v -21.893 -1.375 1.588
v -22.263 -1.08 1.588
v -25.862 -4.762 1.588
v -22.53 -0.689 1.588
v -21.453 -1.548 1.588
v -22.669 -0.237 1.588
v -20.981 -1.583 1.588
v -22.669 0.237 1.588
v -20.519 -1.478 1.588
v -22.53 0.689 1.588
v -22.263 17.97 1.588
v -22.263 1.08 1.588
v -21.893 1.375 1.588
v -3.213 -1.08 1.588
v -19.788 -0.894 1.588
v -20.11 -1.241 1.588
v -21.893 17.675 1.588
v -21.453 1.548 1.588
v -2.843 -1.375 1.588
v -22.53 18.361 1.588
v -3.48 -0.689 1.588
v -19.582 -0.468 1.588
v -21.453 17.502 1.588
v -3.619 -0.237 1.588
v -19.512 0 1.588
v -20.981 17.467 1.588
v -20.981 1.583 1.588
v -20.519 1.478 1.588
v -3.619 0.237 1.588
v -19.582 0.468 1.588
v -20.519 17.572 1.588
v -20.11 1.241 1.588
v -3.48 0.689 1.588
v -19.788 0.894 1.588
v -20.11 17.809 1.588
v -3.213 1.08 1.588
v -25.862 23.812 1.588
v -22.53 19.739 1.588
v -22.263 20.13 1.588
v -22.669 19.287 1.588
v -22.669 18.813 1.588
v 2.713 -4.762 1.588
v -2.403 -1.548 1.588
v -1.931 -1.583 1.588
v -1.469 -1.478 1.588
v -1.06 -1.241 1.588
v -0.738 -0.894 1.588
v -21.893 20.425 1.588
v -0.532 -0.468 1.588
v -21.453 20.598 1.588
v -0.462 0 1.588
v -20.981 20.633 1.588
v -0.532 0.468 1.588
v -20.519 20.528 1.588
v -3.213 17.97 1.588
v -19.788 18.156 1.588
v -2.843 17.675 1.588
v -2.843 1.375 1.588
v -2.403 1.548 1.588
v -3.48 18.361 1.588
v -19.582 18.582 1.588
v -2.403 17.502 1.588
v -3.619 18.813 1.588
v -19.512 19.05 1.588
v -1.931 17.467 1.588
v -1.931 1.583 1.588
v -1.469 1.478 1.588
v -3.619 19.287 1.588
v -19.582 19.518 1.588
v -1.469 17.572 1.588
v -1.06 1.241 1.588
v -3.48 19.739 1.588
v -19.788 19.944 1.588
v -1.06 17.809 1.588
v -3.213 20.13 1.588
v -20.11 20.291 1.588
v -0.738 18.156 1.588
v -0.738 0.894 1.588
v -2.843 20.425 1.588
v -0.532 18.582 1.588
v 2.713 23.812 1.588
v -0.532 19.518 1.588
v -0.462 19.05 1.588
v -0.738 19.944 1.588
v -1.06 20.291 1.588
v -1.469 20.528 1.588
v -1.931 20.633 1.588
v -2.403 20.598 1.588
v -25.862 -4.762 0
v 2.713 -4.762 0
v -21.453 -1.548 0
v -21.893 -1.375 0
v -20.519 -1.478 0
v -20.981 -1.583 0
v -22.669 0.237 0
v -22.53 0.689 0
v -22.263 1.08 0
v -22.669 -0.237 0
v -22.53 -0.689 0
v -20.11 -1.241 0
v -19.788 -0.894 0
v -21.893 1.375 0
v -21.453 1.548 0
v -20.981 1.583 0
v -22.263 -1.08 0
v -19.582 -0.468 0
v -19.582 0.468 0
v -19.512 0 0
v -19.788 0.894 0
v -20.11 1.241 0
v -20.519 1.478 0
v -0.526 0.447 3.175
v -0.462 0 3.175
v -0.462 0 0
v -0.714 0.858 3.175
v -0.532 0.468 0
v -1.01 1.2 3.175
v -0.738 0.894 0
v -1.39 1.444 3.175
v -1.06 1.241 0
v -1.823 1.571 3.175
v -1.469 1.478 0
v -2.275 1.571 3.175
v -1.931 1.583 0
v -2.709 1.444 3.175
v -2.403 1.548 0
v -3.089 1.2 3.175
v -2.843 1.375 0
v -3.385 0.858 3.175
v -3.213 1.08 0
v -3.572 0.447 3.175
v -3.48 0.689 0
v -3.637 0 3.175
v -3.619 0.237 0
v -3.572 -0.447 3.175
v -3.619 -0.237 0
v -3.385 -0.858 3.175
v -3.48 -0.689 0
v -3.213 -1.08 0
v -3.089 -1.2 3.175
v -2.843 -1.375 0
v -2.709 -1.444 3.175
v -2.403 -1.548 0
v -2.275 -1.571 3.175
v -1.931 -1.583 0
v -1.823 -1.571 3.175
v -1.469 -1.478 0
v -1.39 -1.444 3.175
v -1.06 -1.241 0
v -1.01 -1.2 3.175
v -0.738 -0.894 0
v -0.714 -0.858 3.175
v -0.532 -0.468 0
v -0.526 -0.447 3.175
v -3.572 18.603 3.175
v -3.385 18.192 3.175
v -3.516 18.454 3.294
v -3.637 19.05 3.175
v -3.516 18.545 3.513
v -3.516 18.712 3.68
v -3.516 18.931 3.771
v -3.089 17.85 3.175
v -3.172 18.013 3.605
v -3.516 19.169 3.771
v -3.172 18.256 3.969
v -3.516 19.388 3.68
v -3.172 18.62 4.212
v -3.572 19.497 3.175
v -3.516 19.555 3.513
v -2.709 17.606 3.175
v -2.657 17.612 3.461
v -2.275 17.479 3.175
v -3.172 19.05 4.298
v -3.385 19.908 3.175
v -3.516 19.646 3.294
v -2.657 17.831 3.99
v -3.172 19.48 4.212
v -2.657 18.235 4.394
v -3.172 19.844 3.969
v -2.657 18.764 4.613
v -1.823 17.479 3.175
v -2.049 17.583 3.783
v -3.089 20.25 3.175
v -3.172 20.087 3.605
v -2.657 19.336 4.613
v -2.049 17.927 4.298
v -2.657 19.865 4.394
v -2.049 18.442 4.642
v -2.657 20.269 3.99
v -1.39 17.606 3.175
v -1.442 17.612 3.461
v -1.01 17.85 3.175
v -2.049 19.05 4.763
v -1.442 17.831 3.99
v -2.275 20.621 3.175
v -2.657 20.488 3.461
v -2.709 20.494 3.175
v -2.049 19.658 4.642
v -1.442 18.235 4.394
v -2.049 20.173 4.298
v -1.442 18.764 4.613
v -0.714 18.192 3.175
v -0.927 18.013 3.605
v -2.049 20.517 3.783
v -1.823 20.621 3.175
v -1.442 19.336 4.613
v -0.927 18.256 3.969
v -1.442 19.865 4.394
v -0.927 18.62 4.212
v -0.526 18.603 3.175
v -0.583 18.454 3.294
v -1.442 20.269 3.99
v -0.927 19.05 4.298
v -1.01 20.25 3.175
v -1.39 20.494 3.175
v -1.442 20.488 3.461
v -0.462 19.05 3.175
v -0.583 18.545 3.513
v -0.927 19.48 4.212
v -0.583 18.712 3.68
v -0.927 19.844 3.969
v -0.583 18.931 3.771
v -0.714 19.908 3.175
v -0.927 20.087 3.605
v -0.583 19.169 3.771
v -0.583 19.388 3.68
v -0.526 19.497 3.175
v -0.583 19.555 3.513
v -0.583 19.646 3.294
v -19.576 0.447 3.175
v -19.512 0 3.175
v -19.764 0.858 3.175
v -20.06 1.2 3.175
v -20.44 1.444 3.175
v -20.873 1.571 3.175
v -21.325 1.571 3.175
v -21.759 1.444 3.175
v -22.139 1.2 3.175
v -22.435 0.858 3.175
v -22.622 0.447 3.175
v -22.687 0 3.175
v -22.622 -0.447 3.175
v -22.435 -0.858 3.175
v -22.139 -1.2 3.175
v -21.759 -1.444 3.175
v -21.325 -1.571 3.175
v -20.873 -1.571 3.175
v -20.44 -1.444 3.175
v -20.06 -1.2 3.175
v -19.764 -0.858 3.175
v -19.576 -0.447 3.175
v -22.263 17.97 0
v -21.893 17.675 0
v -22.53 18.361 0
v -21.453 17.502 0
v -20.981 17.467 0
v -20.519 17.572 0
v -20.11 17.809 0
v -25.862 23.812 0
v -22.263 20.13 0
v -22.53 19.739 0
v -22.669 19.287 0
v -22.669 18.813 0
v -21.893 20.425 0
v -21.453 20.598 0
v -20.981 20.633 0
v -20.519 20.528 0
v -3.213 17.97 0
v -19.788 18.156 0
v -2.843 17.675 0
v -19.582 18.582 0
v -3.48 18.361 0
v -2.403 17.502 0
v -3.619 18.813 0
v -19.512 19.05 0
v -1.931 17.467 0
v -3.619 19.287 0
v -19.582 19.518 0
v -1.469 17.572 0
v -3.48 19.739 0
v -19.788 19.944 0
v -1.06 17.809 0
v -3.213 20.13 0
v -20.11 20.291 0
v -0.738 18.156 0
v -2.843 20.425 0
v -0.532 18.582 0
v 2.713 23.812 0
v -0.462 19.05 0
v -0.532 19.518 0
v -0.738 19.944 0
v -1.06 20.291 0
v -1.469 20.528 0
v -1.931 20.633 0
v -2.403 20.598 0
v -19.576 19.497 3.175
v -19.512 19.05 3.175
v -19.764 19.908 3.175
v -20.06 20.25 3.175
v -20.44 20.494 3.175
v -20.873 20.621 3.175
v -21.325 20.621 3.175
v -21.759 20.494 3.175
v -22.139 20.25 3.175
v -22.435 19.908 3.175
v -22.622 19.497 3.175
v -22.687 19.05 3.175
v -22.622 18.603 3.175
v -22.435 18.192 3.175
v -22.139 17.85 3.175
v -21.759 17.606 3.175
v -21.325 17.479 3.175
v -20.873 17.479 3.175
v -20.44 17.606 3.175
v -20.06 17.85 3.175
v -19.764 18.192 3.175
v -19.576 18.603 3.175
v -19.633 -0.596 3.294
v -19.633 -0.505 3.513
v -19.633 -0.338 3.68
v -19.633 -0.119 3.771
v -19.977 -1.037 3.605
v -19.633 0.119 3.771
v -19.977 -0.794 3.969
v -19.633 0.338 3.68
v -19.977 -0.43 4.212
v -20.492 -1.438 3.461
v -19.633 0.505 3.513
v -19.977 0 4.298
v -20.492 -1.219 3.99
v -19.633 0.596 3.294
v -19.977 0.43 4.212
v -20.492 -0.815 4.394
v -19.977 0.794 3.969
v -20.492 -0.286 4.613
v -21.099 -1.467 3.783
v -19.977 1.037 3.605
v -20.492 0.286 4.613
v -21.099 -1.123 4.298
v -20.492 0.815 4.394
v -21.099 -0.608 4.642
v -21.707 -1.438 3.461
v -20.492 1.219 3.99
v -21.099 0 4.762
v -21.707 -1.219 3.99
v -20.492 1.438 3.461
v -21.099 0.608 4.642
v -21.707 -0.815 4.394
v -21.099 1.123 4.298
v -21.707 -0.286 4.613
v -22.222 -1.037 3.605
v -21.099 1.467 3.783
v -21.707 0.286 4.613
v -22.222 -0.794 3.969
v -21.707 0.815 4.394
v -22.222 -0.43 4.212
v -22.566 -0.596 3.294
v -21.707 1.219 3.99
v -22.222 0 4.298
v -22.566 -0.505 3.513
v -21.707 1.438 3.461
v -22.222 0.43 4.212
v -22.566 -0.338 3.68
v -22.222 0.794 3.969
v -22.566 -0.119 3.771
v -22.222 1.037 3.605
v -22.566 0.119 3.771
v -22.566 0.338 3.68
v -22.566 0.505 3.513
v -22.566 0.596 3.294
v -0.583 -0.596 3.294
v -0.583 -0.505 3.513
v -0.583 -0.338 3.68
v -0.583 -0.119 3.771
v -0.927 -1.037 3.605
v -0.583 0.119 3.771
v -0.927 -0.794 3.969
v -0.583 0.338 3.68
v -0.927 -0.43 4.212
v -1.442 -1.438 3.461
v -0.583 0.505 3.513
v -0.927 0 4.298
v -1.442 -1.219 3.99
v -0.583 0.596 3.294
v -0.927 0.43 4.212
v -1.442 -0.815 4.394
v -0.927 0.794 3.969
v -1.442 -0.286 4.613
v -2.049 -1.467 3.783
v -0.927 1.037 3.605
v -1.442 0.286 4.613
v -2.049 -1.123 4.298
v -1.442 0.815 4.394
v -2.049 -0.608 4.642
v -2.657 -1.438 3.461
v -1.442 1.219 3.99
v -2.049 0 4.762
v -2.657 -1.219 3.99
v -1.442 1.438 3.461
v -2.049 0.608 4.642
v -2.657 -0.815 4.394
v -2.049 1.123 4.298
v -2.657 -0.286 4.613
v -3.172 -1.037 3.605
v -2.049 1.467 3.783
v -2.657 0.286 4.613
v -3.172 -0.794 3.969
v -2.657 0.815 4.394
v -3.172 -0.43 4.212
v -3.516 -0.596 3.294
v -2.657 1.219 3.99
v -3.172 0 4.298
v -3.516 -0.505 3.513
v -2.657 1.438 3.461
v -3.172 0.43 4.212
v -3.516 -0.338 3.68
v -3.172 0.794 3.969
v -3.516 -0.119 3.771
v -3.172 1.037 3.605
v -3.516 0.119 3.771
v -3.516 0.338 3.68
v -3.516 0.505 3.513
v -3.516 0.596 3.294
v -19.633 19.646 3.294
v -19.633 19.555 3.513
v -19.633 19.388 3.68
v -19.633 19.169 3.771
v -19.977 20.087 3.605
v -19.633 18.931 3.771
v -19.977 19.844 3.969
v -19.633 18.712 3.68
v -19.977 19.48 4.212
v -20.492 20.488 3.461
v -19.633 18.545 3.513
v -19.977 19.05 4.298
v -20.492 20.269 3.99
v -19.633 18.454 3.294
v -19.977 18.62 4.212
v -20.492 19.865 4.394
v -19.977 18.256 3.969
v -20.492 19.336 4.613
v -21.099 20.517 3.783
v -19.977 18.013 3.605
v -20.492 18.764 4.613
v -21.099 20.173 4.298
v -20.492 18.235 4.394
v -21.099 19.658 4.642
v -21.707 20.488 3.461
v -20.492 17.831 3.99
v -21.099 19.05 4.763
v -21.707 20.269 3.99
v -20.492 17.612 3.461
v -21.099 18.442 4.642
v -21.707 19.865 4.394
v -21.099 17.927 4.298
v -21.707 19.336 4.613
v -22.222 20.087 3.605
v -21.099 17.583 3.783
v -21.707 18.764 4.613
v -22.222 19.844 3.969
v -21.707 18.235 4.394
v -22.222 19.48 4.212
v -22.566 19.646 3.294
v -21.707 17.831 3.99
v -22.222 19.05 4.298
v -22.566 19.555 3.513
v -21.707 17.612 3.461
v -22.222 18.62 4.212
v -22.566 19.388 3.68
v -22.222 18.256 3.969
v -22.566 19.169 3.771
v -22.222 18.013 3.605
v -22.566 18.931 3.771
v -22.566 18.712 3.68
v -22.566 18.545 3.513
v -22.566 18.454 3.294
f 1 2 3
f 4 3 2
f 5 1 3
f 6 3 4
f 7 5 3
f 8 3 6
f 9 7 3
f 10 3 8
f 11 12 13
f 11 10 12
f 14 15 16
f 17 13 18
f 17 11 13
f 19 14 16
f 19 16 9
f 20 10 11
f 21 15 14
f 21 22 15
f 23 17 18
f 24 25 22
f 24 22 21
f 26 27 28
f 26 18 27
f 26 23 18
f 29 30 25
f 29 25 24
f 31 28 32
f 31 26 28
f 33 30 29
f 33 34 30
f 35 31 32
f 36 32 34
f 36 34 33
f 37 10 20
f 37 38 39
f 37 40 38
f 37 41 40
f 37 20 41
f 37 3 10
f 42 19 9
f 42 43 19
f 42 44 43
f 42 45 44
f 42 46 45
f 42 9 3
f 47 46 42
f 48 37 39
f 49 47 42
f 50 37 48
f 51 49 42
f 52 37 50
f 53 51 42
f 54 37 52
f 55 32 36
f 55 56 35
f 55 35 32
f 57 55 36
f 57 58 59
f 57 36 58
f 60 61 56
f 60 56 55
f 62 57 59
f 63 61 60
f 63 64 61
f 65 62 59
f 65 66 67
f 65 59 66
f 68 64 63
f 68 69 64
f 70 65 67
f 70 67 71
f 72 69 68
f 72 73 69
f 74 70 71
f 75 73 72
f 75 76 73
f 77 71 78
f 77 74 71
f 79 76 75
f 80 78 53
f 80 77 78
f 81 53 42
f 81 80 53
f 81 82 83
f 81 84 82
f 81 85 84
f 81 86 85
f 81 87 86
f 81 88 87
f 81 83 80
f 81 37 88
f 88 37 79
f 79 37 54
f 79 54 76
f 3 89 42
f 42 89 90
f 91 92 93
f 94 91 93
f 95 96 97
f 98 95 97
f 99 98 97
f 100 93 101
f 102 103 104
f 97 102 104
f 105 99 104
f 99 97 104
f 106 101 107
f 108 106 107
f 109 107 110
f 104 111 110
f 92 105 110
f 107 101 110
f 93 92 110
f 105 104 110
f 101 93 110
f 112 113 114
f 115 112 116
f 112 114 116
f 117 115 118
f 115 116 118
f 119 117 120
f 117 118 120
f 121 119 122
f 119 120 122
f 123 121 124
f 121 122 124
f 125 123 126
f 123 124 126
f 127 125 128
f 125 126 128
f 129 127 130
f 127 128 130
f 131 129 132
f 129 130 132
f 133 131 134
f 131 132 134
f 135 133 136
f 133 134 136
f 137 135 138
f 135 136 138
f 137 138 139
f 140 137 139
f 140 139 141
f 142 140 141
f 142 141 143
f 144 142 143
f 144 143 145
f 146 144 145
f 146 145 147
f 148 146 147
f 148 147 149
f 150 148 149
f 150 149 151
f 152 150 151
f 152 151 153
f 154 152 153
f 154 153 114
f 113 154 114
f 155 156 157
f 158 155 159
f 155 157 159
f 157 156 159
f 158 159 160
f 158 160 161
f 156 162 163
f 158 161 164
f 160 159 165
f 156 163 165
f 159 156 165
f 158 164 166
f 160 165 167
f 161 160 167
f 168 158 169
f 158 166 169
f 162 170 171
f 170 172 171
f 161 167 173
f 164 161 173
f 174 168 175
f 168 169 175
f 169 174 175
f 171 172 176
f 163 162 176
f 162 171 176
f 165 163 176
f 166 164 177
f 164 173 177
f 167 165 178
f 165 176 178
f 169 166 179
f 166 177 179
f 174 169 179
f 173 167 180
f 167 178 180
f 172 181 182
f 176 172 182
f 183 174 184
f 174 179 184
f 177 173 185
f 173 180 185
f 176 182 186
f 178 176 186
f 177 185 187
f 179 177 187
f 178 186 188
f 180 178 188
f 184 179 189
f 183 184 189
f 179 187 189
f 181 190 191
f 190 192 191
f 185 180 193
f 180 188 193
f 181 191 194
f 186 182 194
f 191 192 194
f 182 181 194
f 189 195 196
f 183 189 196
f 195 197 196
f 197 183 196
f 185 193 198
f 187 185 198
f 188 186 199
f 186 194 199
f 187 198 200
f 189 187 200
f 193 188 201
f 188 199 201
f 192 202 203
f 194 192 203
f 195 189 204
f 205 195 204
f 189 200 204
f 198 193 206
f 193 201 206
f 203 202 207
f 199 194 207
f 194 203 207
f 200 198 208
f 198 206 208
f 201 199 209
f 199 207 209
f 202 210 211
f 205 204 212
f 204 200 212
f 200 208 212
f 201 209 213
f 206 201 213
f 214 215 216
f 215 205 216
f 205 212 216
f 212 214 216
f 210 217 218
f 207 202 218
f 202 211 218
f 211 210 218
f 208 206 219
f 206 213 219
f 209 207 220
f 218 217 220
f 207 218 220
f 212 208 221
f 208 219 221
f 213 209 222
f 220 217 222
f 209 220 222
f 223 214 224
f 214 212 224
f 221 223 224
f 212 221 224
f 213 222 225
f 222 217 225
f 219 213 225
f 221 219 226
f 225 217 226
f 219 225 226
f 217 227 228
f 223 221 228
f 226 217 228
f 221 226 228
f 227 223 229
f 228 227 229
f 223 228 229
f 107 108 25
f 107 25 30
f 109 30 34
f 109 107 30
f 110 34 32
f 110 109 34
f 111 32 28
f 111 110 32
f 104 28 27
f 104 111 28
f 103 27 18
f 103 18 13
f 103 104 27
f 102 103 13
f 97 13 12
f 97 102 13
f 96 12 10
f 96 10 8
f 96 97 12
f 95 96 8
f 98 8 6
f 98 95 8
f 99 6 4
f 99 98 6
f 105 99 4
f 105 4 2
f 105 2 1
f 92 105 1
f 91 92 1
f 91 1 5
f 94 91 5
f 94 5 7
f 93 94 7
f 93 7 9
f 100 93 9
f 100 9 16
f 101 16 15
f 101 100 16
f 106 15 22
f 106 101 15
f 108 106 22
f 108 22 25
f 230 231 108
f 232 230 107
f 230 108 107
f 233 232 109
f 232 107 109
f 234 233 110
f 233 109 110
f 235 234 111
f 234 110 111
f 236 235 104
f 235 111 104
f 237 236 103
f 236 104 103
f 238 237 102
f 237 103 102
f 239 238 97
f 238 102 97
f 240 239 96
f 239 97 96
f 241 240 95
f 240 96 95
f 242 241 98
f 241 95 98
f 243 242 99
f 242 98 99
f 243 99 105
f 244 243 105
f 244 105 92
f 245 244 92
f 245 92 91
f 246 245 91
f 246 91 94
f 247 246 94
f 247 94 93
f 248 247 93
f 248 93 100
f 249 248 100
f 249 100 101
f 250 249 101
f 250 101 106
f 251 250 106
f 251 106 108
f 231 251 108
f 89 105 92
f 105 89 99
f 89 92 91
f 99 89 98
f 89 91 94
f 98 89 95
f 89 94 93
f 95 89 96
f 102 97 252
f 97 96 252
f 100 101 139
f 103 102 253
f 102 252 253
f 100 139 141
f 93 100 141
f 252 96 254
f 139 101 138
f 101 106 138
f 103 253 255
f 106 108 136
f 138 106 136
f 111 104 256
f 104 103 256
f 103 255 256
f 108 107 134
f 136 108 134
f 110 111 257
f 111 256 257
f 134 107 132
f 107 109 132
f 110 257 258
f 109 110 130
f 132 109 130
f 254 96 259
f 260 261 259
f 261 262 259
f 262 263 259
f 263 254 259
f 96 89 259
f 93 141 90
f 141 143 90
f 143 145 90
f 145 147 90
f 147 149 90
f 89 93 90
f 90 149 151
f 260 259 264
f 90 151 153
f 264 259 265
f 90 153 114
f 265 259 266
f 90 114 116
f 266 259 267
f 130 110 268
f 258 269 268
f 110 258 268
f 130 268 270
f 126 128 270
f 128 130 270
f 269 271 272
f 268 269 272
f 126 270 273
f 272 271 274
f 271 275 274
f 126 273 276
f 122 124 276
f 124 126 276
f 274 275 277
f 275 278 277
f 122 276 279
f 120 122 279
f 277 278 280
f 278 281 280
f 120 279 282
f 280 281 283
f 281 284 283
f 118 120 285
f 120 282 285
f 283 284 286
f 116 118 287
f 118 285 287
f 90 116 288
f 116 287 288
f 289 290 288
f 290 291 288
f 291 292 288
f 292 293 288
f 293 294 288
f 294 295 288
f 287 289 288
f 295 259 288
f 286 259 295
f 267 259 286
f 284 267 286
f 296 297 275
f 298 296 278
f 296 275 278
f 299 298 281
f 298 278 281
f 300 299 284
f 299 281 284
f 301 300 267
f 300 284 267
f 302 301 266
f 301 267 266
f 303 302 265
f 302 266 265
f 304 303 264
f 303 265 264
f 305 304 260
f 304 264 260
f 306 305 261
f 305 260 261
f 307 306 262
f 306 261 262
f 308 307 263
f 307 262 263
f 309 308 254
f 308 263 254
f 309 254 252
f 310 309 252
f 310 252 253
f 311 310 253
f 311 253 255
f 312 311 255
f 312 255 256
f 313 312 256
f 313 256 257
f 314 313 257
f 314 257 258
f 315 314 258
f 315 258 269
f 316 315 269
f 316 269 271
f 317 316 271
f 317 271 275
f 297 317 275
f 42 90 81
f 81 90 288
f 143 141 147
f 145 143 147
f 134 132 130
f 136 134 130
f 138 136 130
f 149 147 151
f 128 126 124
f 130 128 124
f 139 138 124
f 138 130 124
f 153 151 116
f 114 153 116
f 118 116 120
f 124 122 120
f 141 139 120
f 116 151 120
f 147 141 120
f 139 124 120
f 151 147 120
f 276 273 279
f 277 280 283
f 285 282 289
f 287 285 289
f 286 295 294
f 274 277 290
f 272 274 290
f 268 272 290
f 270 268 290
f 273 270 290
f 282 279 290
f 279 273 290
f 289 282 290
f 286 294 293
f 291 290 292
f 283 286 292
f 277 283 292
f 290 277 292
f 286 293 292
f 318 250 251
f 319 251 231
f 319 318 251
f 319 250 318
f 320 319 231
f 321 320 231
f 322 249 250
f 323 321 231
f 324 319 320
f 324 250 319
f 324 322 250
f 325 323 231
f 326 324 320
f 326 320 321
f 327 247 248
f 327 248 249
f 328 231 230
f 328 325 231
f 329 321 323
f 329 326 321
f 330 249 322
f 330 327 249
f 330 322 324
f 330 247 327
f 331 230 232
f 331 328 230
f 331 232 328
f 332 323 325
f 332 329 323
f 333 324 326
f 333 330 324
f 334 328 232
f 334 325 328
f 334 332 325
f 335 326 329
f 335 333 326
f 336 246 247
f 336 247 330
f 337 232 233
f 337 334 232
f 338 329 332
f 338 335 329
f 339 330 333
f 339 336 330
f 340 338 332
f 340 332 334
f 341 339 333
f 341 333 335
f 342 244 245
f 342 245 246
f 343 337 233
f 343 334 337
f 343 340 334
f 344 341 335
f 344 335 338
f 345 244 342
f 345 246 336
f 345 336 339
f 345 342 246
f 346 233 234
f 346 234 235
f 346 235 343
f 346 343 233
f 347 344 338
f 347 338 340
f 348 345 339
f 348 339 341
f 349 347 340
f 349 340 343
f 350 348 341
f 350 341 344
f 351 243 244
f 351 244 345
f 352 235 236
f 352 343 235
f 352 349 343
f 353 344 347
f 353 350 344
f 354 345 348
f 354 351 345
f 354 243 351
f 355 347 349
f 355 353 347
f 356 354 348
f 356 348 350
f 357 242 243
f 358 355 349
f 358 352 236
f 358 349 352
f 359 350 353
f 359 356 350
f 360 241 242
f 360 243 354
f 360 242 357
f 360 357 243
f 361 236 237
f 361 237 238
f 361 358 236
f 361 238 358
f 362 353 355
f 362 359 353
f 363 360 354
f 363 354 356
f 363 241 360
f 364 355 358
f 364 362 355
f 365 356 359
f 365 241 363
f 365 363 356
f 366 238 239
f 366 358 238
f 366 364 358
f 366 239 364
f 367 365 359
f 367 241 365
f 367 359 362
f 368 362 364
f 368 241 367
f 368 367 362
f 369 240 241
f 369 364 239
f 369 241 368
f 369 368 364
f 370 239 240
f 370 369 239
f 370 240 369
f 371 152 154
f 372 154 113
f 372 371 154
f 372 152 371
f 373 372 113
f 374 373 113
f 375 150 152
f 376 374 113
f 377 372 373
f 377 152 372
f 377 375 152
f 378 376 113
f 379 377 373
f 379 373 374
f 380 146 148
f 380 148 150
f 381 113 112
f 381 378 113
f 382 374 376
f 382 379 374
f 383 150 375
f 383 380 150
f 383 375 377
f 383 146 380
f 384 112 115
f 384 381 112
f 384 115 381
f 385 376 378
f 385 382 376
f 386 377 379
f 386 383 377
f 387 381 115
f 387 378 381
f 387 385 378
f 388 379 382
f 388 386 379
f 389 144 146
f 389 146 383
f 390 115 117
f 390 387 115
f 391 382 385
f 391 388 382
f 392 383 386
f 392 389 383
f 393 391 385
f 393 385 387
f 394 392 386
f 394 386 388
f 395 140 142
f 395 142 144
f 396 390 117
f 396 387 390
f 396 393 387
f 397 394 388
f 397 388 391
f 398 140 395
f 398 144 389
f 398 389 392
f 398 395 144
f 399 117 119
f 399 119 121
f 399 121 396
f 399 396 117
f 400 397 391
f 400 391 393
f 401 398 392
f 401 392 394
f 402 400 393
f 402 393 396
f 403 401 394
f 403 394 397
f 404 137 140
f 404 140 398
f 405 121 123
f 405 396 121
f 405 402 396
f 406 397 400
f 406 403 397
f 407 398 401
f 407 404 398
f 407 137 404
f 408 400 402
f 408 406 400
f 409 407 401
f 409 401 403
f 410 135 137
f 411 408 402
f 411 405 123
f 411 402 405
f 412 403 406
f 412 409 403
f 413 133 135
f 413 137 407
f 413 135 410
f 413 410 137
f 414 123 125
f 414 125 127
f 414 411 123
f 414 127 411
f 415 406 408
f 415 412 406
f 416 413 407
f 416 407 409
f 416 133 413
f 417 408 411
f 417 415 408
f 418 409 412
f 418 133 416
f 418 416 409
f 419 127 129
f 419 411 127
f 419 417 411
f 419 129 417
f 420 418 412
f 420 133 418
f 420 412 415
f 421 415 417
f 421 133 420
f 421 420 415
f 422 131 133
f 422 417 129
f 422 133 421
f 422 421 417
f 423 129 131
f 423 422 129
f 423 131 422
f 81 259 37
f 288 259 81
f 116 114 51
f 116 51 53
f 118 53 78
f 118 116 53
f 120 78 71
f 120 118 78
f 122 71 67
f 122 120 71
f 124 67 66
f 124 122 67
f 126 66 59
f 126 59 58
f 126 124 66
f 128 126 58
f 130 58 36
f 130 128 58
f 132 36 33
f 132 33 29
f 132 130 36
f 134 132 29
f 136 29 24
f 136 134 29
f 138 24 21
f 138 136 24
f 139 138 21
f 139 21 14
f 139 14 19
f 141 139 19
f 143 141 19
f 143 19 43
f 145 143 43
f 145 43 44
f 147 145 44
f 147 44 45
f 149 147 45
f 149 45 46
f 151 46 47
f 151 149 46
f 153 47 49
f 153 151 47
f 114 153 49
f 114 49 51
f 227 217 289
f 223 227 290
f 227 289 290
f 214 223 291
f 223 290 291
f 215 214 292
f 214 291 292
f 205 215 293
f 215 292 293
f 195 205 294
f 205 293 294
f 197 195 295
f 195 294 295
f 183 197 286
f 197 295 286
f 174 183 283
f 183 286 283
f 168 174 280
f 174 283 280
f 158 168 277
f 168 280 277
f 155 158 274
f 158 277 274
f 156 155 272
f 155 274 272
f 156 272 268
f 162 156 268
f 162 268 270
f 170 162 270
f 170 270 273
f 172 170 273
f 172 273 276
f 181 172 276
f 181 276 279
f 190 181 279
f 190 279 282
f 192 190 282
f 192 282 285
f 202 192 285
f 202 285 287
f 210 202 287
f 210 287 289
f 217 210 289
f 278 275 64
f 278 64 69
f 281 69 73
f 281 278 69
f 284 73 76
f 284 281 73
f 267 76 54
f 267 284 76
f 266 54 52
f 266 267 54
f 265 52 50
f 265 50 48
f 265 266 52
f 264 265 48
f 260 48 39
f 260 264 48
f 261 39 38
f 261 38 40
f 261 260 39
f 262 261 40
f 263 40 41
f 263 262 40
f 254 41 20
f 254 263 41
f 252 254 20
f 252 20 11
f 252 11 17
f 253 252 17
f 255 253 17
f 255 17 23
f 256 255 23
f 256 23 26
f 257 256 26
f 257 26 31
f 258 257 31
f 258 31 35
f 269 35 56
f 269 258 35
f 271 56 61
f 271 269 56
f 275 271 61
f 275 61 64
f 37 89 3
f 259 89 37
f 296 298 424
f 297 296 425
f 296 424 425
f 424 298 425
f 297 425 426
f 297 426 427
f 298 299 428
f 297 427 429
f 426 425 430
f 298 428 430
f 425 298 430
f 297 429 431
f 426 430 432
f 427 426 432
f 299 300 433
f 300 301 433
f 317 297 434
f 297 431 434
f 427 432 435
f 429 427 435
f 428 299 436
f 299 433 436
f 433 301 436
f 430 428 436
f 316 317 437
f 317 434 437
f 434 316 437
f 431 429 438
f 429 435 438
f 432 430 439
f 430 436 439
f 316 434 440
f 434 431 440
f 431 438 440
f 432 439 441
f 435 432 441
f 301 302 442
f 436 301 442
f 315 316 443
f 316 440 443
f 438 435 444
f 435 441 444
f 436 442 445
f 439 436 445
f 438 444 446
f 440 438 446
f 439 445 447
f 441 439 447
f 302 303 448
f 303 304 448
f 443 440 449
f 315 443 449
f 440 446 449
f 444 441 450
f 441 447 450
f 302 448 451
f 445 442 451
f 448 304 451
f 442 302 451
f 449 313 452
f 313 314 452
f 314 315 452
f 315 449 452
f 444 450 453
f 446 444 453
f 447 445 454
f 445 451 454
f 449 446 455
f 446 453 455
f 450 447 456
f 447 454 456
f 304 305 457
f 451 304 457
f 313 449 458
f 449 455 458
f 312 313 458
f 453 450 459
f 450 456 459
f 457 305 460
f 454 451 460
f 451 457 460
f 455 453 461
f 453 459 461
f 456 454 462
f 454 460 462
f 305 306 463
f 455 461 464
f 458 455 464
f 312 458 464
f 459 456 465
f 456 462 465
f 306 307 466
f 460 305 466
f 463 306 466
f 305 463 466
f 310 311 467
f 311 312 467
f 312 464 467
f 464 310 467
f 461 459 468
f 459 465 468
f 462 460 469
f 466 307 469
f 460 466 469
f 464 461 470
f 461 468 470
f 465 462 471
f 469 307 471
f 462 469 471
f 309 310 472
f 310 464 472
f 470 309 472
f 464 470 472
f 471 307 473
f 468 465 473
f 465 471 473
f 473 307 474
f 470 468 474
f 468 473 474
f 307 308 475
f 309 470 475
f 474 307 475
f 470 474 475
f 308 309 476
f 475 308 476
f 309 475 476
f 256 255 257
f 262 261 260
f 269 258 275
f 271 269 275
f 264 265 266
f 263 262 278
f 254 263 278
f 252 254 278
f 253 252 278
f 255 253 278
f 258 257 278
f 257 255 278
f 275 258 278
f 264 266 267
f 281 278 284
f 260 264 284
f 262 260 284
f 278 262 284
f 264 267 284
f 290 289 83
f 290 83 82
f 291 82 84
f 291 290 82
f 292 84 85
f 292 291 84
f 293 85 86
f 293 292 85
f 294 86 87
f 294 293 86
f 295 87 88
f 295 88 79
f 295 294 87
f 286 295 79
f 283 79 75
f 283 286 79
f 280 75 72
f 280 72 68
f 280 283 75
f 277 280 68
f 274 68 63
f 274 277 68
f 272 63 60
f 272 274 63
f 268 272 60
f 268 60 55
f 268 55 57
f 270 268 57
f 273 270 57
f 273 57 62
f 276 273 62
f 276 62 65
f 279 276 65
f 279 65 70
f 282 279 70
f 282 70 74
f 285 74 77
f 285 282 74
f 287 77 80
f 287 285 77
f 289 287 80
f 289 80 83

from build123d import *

# Parameters (mm, degrees)
F0_R     = 1.5875
F1_DEPTH = 3.175
F0_W     = 28.575
F0_H     = 28.575
F2_DEPTH = 1.5875


with BuildPart() as f1:
    # F0 (on Top) → F1 (new body)
    with BuildSketch(Plane.XY):
        with Locations((-21.0992920049, 19.05)):
            Circle(F0_R)
    extrude(amount=F1_DEPTH)

    # F7 (on face) → F8 (revolve)
    with BuildSketch(Plane.XY.offset(3.175)):
        with BuildLine():
            Line((-22.6867920049, 19.05), (-21.0992920049, 19.05))
            Line((-21.0992920049, 19.05), (-19.5117920049, 19.05))
            ThreePointArc((-19.5117920049, 19.05), (-21.0992920049, 20.6375), (-22.6867920049, 19.05))
        make_face()
    revolve(axis=Axis((-21.0992920049, 19.05, 3.175), (1, 0, 0)))


with BuildPart() as f1b:
    # F0 (on Top) → F1, piece 2 (new body)
    with BuildSketch(Plane.XY):
        with Locations((-2.0492920049, 19.05)):
            Circle(F0_R)
    extrude(amount=F1_DEPTH)

    # F9 (on face) → F10 (revolve)
    with BuildSketch(Plane.XY.offset(3.175)):
        with BuildLine():
            Line((-0.4617920049, 19.05), (-2.0492920049, 19.05))
            Line((-2.0492920049, 19.05), (-3.6367920049, 19.05))
            ThreePointArc((-3.6367920049, 19.05), (-2.0492920049, 17.4625), (-0.4617920049, 19.05))
        make_face()
    revolve(axis=Axis((-2.0492920049, 19.05, 3.175), (-1, 0, 0)))


with BuildPart() as f1c:
    # F0 (on Top) → F1, piece 3 (new body)
    with BuildSketch(Plane.XY):
        with Locations((-2.0492920049, 0)):
            Circle(F0_R)
    extrude(amount=F1_DEPTH)

    # F5 (on face) → F6 (revolve)
    with BuildSketch(Plane.XY.offset(3.175)):
        with BuildLine():
            Line((-3.6367920049, 0), (-0.4617920049, 0))
            ThreePointArc((-0.4617920049, 0), (-2.0492920049, 1.5875), (-3.6367920049, 0))
        make_face()
    revolve(axis=Axis((-2.0492920049, 0, 3.175), (-1, 0, 0)))


with BuildPart() as f1d:
    # F0 (on Top) → F1, piece 4 (new body)
    with BuildSketch(Plane.XY):
        with Locations((-21.0992920049, 0)):
            Circle(F0_R)
    extrude(amount=F1_DEPTH)

    # F3 (on face) → F4 (revolve)
    with BuildSketch(Plane.XY.offset(3.175)):
        with BuildLine():
            Line((-22.6867920049, 0), (-19.5117920049, 0))
            ThreePointArc((-19.5117920049, 0), (-21.0992920049, 1.5875), (-22.6867920049, 0))
        make_face()
    revolve(axis=Axis((-21.0992920049, 0, 3.175), (-1, 0, 0)))


with BuildPart() as f2:
    # F0 (on Top) → F2 (new body)
    with BuildSketch(Plane.XY):
        with Locations((-11.5742920049, 9.525)):
            Rectangle(F0_W, F0_H)
        with Locations((-21.0992920049, 0)):
            Circle(F0_R, mode=Mode.SUBTRACT)
        with Locations((-2.0492920049, 0)):
            Circle(F0_R, mode=Mode.SUBTRACT)
        with Locations((-21.0992920049, 19.05)):
            Circle(F0_R, mode=Mode.SUBTRACT)
        with Locations((-2.0492920049, 19.05)):
            Circle(F0_R, mode=Mode.SUBTRACT)
    extrude(amount=F2_DEPTH)


solid = Compound([f1.part, f1b.part, f1c.part, f1d.part, f2.part])
